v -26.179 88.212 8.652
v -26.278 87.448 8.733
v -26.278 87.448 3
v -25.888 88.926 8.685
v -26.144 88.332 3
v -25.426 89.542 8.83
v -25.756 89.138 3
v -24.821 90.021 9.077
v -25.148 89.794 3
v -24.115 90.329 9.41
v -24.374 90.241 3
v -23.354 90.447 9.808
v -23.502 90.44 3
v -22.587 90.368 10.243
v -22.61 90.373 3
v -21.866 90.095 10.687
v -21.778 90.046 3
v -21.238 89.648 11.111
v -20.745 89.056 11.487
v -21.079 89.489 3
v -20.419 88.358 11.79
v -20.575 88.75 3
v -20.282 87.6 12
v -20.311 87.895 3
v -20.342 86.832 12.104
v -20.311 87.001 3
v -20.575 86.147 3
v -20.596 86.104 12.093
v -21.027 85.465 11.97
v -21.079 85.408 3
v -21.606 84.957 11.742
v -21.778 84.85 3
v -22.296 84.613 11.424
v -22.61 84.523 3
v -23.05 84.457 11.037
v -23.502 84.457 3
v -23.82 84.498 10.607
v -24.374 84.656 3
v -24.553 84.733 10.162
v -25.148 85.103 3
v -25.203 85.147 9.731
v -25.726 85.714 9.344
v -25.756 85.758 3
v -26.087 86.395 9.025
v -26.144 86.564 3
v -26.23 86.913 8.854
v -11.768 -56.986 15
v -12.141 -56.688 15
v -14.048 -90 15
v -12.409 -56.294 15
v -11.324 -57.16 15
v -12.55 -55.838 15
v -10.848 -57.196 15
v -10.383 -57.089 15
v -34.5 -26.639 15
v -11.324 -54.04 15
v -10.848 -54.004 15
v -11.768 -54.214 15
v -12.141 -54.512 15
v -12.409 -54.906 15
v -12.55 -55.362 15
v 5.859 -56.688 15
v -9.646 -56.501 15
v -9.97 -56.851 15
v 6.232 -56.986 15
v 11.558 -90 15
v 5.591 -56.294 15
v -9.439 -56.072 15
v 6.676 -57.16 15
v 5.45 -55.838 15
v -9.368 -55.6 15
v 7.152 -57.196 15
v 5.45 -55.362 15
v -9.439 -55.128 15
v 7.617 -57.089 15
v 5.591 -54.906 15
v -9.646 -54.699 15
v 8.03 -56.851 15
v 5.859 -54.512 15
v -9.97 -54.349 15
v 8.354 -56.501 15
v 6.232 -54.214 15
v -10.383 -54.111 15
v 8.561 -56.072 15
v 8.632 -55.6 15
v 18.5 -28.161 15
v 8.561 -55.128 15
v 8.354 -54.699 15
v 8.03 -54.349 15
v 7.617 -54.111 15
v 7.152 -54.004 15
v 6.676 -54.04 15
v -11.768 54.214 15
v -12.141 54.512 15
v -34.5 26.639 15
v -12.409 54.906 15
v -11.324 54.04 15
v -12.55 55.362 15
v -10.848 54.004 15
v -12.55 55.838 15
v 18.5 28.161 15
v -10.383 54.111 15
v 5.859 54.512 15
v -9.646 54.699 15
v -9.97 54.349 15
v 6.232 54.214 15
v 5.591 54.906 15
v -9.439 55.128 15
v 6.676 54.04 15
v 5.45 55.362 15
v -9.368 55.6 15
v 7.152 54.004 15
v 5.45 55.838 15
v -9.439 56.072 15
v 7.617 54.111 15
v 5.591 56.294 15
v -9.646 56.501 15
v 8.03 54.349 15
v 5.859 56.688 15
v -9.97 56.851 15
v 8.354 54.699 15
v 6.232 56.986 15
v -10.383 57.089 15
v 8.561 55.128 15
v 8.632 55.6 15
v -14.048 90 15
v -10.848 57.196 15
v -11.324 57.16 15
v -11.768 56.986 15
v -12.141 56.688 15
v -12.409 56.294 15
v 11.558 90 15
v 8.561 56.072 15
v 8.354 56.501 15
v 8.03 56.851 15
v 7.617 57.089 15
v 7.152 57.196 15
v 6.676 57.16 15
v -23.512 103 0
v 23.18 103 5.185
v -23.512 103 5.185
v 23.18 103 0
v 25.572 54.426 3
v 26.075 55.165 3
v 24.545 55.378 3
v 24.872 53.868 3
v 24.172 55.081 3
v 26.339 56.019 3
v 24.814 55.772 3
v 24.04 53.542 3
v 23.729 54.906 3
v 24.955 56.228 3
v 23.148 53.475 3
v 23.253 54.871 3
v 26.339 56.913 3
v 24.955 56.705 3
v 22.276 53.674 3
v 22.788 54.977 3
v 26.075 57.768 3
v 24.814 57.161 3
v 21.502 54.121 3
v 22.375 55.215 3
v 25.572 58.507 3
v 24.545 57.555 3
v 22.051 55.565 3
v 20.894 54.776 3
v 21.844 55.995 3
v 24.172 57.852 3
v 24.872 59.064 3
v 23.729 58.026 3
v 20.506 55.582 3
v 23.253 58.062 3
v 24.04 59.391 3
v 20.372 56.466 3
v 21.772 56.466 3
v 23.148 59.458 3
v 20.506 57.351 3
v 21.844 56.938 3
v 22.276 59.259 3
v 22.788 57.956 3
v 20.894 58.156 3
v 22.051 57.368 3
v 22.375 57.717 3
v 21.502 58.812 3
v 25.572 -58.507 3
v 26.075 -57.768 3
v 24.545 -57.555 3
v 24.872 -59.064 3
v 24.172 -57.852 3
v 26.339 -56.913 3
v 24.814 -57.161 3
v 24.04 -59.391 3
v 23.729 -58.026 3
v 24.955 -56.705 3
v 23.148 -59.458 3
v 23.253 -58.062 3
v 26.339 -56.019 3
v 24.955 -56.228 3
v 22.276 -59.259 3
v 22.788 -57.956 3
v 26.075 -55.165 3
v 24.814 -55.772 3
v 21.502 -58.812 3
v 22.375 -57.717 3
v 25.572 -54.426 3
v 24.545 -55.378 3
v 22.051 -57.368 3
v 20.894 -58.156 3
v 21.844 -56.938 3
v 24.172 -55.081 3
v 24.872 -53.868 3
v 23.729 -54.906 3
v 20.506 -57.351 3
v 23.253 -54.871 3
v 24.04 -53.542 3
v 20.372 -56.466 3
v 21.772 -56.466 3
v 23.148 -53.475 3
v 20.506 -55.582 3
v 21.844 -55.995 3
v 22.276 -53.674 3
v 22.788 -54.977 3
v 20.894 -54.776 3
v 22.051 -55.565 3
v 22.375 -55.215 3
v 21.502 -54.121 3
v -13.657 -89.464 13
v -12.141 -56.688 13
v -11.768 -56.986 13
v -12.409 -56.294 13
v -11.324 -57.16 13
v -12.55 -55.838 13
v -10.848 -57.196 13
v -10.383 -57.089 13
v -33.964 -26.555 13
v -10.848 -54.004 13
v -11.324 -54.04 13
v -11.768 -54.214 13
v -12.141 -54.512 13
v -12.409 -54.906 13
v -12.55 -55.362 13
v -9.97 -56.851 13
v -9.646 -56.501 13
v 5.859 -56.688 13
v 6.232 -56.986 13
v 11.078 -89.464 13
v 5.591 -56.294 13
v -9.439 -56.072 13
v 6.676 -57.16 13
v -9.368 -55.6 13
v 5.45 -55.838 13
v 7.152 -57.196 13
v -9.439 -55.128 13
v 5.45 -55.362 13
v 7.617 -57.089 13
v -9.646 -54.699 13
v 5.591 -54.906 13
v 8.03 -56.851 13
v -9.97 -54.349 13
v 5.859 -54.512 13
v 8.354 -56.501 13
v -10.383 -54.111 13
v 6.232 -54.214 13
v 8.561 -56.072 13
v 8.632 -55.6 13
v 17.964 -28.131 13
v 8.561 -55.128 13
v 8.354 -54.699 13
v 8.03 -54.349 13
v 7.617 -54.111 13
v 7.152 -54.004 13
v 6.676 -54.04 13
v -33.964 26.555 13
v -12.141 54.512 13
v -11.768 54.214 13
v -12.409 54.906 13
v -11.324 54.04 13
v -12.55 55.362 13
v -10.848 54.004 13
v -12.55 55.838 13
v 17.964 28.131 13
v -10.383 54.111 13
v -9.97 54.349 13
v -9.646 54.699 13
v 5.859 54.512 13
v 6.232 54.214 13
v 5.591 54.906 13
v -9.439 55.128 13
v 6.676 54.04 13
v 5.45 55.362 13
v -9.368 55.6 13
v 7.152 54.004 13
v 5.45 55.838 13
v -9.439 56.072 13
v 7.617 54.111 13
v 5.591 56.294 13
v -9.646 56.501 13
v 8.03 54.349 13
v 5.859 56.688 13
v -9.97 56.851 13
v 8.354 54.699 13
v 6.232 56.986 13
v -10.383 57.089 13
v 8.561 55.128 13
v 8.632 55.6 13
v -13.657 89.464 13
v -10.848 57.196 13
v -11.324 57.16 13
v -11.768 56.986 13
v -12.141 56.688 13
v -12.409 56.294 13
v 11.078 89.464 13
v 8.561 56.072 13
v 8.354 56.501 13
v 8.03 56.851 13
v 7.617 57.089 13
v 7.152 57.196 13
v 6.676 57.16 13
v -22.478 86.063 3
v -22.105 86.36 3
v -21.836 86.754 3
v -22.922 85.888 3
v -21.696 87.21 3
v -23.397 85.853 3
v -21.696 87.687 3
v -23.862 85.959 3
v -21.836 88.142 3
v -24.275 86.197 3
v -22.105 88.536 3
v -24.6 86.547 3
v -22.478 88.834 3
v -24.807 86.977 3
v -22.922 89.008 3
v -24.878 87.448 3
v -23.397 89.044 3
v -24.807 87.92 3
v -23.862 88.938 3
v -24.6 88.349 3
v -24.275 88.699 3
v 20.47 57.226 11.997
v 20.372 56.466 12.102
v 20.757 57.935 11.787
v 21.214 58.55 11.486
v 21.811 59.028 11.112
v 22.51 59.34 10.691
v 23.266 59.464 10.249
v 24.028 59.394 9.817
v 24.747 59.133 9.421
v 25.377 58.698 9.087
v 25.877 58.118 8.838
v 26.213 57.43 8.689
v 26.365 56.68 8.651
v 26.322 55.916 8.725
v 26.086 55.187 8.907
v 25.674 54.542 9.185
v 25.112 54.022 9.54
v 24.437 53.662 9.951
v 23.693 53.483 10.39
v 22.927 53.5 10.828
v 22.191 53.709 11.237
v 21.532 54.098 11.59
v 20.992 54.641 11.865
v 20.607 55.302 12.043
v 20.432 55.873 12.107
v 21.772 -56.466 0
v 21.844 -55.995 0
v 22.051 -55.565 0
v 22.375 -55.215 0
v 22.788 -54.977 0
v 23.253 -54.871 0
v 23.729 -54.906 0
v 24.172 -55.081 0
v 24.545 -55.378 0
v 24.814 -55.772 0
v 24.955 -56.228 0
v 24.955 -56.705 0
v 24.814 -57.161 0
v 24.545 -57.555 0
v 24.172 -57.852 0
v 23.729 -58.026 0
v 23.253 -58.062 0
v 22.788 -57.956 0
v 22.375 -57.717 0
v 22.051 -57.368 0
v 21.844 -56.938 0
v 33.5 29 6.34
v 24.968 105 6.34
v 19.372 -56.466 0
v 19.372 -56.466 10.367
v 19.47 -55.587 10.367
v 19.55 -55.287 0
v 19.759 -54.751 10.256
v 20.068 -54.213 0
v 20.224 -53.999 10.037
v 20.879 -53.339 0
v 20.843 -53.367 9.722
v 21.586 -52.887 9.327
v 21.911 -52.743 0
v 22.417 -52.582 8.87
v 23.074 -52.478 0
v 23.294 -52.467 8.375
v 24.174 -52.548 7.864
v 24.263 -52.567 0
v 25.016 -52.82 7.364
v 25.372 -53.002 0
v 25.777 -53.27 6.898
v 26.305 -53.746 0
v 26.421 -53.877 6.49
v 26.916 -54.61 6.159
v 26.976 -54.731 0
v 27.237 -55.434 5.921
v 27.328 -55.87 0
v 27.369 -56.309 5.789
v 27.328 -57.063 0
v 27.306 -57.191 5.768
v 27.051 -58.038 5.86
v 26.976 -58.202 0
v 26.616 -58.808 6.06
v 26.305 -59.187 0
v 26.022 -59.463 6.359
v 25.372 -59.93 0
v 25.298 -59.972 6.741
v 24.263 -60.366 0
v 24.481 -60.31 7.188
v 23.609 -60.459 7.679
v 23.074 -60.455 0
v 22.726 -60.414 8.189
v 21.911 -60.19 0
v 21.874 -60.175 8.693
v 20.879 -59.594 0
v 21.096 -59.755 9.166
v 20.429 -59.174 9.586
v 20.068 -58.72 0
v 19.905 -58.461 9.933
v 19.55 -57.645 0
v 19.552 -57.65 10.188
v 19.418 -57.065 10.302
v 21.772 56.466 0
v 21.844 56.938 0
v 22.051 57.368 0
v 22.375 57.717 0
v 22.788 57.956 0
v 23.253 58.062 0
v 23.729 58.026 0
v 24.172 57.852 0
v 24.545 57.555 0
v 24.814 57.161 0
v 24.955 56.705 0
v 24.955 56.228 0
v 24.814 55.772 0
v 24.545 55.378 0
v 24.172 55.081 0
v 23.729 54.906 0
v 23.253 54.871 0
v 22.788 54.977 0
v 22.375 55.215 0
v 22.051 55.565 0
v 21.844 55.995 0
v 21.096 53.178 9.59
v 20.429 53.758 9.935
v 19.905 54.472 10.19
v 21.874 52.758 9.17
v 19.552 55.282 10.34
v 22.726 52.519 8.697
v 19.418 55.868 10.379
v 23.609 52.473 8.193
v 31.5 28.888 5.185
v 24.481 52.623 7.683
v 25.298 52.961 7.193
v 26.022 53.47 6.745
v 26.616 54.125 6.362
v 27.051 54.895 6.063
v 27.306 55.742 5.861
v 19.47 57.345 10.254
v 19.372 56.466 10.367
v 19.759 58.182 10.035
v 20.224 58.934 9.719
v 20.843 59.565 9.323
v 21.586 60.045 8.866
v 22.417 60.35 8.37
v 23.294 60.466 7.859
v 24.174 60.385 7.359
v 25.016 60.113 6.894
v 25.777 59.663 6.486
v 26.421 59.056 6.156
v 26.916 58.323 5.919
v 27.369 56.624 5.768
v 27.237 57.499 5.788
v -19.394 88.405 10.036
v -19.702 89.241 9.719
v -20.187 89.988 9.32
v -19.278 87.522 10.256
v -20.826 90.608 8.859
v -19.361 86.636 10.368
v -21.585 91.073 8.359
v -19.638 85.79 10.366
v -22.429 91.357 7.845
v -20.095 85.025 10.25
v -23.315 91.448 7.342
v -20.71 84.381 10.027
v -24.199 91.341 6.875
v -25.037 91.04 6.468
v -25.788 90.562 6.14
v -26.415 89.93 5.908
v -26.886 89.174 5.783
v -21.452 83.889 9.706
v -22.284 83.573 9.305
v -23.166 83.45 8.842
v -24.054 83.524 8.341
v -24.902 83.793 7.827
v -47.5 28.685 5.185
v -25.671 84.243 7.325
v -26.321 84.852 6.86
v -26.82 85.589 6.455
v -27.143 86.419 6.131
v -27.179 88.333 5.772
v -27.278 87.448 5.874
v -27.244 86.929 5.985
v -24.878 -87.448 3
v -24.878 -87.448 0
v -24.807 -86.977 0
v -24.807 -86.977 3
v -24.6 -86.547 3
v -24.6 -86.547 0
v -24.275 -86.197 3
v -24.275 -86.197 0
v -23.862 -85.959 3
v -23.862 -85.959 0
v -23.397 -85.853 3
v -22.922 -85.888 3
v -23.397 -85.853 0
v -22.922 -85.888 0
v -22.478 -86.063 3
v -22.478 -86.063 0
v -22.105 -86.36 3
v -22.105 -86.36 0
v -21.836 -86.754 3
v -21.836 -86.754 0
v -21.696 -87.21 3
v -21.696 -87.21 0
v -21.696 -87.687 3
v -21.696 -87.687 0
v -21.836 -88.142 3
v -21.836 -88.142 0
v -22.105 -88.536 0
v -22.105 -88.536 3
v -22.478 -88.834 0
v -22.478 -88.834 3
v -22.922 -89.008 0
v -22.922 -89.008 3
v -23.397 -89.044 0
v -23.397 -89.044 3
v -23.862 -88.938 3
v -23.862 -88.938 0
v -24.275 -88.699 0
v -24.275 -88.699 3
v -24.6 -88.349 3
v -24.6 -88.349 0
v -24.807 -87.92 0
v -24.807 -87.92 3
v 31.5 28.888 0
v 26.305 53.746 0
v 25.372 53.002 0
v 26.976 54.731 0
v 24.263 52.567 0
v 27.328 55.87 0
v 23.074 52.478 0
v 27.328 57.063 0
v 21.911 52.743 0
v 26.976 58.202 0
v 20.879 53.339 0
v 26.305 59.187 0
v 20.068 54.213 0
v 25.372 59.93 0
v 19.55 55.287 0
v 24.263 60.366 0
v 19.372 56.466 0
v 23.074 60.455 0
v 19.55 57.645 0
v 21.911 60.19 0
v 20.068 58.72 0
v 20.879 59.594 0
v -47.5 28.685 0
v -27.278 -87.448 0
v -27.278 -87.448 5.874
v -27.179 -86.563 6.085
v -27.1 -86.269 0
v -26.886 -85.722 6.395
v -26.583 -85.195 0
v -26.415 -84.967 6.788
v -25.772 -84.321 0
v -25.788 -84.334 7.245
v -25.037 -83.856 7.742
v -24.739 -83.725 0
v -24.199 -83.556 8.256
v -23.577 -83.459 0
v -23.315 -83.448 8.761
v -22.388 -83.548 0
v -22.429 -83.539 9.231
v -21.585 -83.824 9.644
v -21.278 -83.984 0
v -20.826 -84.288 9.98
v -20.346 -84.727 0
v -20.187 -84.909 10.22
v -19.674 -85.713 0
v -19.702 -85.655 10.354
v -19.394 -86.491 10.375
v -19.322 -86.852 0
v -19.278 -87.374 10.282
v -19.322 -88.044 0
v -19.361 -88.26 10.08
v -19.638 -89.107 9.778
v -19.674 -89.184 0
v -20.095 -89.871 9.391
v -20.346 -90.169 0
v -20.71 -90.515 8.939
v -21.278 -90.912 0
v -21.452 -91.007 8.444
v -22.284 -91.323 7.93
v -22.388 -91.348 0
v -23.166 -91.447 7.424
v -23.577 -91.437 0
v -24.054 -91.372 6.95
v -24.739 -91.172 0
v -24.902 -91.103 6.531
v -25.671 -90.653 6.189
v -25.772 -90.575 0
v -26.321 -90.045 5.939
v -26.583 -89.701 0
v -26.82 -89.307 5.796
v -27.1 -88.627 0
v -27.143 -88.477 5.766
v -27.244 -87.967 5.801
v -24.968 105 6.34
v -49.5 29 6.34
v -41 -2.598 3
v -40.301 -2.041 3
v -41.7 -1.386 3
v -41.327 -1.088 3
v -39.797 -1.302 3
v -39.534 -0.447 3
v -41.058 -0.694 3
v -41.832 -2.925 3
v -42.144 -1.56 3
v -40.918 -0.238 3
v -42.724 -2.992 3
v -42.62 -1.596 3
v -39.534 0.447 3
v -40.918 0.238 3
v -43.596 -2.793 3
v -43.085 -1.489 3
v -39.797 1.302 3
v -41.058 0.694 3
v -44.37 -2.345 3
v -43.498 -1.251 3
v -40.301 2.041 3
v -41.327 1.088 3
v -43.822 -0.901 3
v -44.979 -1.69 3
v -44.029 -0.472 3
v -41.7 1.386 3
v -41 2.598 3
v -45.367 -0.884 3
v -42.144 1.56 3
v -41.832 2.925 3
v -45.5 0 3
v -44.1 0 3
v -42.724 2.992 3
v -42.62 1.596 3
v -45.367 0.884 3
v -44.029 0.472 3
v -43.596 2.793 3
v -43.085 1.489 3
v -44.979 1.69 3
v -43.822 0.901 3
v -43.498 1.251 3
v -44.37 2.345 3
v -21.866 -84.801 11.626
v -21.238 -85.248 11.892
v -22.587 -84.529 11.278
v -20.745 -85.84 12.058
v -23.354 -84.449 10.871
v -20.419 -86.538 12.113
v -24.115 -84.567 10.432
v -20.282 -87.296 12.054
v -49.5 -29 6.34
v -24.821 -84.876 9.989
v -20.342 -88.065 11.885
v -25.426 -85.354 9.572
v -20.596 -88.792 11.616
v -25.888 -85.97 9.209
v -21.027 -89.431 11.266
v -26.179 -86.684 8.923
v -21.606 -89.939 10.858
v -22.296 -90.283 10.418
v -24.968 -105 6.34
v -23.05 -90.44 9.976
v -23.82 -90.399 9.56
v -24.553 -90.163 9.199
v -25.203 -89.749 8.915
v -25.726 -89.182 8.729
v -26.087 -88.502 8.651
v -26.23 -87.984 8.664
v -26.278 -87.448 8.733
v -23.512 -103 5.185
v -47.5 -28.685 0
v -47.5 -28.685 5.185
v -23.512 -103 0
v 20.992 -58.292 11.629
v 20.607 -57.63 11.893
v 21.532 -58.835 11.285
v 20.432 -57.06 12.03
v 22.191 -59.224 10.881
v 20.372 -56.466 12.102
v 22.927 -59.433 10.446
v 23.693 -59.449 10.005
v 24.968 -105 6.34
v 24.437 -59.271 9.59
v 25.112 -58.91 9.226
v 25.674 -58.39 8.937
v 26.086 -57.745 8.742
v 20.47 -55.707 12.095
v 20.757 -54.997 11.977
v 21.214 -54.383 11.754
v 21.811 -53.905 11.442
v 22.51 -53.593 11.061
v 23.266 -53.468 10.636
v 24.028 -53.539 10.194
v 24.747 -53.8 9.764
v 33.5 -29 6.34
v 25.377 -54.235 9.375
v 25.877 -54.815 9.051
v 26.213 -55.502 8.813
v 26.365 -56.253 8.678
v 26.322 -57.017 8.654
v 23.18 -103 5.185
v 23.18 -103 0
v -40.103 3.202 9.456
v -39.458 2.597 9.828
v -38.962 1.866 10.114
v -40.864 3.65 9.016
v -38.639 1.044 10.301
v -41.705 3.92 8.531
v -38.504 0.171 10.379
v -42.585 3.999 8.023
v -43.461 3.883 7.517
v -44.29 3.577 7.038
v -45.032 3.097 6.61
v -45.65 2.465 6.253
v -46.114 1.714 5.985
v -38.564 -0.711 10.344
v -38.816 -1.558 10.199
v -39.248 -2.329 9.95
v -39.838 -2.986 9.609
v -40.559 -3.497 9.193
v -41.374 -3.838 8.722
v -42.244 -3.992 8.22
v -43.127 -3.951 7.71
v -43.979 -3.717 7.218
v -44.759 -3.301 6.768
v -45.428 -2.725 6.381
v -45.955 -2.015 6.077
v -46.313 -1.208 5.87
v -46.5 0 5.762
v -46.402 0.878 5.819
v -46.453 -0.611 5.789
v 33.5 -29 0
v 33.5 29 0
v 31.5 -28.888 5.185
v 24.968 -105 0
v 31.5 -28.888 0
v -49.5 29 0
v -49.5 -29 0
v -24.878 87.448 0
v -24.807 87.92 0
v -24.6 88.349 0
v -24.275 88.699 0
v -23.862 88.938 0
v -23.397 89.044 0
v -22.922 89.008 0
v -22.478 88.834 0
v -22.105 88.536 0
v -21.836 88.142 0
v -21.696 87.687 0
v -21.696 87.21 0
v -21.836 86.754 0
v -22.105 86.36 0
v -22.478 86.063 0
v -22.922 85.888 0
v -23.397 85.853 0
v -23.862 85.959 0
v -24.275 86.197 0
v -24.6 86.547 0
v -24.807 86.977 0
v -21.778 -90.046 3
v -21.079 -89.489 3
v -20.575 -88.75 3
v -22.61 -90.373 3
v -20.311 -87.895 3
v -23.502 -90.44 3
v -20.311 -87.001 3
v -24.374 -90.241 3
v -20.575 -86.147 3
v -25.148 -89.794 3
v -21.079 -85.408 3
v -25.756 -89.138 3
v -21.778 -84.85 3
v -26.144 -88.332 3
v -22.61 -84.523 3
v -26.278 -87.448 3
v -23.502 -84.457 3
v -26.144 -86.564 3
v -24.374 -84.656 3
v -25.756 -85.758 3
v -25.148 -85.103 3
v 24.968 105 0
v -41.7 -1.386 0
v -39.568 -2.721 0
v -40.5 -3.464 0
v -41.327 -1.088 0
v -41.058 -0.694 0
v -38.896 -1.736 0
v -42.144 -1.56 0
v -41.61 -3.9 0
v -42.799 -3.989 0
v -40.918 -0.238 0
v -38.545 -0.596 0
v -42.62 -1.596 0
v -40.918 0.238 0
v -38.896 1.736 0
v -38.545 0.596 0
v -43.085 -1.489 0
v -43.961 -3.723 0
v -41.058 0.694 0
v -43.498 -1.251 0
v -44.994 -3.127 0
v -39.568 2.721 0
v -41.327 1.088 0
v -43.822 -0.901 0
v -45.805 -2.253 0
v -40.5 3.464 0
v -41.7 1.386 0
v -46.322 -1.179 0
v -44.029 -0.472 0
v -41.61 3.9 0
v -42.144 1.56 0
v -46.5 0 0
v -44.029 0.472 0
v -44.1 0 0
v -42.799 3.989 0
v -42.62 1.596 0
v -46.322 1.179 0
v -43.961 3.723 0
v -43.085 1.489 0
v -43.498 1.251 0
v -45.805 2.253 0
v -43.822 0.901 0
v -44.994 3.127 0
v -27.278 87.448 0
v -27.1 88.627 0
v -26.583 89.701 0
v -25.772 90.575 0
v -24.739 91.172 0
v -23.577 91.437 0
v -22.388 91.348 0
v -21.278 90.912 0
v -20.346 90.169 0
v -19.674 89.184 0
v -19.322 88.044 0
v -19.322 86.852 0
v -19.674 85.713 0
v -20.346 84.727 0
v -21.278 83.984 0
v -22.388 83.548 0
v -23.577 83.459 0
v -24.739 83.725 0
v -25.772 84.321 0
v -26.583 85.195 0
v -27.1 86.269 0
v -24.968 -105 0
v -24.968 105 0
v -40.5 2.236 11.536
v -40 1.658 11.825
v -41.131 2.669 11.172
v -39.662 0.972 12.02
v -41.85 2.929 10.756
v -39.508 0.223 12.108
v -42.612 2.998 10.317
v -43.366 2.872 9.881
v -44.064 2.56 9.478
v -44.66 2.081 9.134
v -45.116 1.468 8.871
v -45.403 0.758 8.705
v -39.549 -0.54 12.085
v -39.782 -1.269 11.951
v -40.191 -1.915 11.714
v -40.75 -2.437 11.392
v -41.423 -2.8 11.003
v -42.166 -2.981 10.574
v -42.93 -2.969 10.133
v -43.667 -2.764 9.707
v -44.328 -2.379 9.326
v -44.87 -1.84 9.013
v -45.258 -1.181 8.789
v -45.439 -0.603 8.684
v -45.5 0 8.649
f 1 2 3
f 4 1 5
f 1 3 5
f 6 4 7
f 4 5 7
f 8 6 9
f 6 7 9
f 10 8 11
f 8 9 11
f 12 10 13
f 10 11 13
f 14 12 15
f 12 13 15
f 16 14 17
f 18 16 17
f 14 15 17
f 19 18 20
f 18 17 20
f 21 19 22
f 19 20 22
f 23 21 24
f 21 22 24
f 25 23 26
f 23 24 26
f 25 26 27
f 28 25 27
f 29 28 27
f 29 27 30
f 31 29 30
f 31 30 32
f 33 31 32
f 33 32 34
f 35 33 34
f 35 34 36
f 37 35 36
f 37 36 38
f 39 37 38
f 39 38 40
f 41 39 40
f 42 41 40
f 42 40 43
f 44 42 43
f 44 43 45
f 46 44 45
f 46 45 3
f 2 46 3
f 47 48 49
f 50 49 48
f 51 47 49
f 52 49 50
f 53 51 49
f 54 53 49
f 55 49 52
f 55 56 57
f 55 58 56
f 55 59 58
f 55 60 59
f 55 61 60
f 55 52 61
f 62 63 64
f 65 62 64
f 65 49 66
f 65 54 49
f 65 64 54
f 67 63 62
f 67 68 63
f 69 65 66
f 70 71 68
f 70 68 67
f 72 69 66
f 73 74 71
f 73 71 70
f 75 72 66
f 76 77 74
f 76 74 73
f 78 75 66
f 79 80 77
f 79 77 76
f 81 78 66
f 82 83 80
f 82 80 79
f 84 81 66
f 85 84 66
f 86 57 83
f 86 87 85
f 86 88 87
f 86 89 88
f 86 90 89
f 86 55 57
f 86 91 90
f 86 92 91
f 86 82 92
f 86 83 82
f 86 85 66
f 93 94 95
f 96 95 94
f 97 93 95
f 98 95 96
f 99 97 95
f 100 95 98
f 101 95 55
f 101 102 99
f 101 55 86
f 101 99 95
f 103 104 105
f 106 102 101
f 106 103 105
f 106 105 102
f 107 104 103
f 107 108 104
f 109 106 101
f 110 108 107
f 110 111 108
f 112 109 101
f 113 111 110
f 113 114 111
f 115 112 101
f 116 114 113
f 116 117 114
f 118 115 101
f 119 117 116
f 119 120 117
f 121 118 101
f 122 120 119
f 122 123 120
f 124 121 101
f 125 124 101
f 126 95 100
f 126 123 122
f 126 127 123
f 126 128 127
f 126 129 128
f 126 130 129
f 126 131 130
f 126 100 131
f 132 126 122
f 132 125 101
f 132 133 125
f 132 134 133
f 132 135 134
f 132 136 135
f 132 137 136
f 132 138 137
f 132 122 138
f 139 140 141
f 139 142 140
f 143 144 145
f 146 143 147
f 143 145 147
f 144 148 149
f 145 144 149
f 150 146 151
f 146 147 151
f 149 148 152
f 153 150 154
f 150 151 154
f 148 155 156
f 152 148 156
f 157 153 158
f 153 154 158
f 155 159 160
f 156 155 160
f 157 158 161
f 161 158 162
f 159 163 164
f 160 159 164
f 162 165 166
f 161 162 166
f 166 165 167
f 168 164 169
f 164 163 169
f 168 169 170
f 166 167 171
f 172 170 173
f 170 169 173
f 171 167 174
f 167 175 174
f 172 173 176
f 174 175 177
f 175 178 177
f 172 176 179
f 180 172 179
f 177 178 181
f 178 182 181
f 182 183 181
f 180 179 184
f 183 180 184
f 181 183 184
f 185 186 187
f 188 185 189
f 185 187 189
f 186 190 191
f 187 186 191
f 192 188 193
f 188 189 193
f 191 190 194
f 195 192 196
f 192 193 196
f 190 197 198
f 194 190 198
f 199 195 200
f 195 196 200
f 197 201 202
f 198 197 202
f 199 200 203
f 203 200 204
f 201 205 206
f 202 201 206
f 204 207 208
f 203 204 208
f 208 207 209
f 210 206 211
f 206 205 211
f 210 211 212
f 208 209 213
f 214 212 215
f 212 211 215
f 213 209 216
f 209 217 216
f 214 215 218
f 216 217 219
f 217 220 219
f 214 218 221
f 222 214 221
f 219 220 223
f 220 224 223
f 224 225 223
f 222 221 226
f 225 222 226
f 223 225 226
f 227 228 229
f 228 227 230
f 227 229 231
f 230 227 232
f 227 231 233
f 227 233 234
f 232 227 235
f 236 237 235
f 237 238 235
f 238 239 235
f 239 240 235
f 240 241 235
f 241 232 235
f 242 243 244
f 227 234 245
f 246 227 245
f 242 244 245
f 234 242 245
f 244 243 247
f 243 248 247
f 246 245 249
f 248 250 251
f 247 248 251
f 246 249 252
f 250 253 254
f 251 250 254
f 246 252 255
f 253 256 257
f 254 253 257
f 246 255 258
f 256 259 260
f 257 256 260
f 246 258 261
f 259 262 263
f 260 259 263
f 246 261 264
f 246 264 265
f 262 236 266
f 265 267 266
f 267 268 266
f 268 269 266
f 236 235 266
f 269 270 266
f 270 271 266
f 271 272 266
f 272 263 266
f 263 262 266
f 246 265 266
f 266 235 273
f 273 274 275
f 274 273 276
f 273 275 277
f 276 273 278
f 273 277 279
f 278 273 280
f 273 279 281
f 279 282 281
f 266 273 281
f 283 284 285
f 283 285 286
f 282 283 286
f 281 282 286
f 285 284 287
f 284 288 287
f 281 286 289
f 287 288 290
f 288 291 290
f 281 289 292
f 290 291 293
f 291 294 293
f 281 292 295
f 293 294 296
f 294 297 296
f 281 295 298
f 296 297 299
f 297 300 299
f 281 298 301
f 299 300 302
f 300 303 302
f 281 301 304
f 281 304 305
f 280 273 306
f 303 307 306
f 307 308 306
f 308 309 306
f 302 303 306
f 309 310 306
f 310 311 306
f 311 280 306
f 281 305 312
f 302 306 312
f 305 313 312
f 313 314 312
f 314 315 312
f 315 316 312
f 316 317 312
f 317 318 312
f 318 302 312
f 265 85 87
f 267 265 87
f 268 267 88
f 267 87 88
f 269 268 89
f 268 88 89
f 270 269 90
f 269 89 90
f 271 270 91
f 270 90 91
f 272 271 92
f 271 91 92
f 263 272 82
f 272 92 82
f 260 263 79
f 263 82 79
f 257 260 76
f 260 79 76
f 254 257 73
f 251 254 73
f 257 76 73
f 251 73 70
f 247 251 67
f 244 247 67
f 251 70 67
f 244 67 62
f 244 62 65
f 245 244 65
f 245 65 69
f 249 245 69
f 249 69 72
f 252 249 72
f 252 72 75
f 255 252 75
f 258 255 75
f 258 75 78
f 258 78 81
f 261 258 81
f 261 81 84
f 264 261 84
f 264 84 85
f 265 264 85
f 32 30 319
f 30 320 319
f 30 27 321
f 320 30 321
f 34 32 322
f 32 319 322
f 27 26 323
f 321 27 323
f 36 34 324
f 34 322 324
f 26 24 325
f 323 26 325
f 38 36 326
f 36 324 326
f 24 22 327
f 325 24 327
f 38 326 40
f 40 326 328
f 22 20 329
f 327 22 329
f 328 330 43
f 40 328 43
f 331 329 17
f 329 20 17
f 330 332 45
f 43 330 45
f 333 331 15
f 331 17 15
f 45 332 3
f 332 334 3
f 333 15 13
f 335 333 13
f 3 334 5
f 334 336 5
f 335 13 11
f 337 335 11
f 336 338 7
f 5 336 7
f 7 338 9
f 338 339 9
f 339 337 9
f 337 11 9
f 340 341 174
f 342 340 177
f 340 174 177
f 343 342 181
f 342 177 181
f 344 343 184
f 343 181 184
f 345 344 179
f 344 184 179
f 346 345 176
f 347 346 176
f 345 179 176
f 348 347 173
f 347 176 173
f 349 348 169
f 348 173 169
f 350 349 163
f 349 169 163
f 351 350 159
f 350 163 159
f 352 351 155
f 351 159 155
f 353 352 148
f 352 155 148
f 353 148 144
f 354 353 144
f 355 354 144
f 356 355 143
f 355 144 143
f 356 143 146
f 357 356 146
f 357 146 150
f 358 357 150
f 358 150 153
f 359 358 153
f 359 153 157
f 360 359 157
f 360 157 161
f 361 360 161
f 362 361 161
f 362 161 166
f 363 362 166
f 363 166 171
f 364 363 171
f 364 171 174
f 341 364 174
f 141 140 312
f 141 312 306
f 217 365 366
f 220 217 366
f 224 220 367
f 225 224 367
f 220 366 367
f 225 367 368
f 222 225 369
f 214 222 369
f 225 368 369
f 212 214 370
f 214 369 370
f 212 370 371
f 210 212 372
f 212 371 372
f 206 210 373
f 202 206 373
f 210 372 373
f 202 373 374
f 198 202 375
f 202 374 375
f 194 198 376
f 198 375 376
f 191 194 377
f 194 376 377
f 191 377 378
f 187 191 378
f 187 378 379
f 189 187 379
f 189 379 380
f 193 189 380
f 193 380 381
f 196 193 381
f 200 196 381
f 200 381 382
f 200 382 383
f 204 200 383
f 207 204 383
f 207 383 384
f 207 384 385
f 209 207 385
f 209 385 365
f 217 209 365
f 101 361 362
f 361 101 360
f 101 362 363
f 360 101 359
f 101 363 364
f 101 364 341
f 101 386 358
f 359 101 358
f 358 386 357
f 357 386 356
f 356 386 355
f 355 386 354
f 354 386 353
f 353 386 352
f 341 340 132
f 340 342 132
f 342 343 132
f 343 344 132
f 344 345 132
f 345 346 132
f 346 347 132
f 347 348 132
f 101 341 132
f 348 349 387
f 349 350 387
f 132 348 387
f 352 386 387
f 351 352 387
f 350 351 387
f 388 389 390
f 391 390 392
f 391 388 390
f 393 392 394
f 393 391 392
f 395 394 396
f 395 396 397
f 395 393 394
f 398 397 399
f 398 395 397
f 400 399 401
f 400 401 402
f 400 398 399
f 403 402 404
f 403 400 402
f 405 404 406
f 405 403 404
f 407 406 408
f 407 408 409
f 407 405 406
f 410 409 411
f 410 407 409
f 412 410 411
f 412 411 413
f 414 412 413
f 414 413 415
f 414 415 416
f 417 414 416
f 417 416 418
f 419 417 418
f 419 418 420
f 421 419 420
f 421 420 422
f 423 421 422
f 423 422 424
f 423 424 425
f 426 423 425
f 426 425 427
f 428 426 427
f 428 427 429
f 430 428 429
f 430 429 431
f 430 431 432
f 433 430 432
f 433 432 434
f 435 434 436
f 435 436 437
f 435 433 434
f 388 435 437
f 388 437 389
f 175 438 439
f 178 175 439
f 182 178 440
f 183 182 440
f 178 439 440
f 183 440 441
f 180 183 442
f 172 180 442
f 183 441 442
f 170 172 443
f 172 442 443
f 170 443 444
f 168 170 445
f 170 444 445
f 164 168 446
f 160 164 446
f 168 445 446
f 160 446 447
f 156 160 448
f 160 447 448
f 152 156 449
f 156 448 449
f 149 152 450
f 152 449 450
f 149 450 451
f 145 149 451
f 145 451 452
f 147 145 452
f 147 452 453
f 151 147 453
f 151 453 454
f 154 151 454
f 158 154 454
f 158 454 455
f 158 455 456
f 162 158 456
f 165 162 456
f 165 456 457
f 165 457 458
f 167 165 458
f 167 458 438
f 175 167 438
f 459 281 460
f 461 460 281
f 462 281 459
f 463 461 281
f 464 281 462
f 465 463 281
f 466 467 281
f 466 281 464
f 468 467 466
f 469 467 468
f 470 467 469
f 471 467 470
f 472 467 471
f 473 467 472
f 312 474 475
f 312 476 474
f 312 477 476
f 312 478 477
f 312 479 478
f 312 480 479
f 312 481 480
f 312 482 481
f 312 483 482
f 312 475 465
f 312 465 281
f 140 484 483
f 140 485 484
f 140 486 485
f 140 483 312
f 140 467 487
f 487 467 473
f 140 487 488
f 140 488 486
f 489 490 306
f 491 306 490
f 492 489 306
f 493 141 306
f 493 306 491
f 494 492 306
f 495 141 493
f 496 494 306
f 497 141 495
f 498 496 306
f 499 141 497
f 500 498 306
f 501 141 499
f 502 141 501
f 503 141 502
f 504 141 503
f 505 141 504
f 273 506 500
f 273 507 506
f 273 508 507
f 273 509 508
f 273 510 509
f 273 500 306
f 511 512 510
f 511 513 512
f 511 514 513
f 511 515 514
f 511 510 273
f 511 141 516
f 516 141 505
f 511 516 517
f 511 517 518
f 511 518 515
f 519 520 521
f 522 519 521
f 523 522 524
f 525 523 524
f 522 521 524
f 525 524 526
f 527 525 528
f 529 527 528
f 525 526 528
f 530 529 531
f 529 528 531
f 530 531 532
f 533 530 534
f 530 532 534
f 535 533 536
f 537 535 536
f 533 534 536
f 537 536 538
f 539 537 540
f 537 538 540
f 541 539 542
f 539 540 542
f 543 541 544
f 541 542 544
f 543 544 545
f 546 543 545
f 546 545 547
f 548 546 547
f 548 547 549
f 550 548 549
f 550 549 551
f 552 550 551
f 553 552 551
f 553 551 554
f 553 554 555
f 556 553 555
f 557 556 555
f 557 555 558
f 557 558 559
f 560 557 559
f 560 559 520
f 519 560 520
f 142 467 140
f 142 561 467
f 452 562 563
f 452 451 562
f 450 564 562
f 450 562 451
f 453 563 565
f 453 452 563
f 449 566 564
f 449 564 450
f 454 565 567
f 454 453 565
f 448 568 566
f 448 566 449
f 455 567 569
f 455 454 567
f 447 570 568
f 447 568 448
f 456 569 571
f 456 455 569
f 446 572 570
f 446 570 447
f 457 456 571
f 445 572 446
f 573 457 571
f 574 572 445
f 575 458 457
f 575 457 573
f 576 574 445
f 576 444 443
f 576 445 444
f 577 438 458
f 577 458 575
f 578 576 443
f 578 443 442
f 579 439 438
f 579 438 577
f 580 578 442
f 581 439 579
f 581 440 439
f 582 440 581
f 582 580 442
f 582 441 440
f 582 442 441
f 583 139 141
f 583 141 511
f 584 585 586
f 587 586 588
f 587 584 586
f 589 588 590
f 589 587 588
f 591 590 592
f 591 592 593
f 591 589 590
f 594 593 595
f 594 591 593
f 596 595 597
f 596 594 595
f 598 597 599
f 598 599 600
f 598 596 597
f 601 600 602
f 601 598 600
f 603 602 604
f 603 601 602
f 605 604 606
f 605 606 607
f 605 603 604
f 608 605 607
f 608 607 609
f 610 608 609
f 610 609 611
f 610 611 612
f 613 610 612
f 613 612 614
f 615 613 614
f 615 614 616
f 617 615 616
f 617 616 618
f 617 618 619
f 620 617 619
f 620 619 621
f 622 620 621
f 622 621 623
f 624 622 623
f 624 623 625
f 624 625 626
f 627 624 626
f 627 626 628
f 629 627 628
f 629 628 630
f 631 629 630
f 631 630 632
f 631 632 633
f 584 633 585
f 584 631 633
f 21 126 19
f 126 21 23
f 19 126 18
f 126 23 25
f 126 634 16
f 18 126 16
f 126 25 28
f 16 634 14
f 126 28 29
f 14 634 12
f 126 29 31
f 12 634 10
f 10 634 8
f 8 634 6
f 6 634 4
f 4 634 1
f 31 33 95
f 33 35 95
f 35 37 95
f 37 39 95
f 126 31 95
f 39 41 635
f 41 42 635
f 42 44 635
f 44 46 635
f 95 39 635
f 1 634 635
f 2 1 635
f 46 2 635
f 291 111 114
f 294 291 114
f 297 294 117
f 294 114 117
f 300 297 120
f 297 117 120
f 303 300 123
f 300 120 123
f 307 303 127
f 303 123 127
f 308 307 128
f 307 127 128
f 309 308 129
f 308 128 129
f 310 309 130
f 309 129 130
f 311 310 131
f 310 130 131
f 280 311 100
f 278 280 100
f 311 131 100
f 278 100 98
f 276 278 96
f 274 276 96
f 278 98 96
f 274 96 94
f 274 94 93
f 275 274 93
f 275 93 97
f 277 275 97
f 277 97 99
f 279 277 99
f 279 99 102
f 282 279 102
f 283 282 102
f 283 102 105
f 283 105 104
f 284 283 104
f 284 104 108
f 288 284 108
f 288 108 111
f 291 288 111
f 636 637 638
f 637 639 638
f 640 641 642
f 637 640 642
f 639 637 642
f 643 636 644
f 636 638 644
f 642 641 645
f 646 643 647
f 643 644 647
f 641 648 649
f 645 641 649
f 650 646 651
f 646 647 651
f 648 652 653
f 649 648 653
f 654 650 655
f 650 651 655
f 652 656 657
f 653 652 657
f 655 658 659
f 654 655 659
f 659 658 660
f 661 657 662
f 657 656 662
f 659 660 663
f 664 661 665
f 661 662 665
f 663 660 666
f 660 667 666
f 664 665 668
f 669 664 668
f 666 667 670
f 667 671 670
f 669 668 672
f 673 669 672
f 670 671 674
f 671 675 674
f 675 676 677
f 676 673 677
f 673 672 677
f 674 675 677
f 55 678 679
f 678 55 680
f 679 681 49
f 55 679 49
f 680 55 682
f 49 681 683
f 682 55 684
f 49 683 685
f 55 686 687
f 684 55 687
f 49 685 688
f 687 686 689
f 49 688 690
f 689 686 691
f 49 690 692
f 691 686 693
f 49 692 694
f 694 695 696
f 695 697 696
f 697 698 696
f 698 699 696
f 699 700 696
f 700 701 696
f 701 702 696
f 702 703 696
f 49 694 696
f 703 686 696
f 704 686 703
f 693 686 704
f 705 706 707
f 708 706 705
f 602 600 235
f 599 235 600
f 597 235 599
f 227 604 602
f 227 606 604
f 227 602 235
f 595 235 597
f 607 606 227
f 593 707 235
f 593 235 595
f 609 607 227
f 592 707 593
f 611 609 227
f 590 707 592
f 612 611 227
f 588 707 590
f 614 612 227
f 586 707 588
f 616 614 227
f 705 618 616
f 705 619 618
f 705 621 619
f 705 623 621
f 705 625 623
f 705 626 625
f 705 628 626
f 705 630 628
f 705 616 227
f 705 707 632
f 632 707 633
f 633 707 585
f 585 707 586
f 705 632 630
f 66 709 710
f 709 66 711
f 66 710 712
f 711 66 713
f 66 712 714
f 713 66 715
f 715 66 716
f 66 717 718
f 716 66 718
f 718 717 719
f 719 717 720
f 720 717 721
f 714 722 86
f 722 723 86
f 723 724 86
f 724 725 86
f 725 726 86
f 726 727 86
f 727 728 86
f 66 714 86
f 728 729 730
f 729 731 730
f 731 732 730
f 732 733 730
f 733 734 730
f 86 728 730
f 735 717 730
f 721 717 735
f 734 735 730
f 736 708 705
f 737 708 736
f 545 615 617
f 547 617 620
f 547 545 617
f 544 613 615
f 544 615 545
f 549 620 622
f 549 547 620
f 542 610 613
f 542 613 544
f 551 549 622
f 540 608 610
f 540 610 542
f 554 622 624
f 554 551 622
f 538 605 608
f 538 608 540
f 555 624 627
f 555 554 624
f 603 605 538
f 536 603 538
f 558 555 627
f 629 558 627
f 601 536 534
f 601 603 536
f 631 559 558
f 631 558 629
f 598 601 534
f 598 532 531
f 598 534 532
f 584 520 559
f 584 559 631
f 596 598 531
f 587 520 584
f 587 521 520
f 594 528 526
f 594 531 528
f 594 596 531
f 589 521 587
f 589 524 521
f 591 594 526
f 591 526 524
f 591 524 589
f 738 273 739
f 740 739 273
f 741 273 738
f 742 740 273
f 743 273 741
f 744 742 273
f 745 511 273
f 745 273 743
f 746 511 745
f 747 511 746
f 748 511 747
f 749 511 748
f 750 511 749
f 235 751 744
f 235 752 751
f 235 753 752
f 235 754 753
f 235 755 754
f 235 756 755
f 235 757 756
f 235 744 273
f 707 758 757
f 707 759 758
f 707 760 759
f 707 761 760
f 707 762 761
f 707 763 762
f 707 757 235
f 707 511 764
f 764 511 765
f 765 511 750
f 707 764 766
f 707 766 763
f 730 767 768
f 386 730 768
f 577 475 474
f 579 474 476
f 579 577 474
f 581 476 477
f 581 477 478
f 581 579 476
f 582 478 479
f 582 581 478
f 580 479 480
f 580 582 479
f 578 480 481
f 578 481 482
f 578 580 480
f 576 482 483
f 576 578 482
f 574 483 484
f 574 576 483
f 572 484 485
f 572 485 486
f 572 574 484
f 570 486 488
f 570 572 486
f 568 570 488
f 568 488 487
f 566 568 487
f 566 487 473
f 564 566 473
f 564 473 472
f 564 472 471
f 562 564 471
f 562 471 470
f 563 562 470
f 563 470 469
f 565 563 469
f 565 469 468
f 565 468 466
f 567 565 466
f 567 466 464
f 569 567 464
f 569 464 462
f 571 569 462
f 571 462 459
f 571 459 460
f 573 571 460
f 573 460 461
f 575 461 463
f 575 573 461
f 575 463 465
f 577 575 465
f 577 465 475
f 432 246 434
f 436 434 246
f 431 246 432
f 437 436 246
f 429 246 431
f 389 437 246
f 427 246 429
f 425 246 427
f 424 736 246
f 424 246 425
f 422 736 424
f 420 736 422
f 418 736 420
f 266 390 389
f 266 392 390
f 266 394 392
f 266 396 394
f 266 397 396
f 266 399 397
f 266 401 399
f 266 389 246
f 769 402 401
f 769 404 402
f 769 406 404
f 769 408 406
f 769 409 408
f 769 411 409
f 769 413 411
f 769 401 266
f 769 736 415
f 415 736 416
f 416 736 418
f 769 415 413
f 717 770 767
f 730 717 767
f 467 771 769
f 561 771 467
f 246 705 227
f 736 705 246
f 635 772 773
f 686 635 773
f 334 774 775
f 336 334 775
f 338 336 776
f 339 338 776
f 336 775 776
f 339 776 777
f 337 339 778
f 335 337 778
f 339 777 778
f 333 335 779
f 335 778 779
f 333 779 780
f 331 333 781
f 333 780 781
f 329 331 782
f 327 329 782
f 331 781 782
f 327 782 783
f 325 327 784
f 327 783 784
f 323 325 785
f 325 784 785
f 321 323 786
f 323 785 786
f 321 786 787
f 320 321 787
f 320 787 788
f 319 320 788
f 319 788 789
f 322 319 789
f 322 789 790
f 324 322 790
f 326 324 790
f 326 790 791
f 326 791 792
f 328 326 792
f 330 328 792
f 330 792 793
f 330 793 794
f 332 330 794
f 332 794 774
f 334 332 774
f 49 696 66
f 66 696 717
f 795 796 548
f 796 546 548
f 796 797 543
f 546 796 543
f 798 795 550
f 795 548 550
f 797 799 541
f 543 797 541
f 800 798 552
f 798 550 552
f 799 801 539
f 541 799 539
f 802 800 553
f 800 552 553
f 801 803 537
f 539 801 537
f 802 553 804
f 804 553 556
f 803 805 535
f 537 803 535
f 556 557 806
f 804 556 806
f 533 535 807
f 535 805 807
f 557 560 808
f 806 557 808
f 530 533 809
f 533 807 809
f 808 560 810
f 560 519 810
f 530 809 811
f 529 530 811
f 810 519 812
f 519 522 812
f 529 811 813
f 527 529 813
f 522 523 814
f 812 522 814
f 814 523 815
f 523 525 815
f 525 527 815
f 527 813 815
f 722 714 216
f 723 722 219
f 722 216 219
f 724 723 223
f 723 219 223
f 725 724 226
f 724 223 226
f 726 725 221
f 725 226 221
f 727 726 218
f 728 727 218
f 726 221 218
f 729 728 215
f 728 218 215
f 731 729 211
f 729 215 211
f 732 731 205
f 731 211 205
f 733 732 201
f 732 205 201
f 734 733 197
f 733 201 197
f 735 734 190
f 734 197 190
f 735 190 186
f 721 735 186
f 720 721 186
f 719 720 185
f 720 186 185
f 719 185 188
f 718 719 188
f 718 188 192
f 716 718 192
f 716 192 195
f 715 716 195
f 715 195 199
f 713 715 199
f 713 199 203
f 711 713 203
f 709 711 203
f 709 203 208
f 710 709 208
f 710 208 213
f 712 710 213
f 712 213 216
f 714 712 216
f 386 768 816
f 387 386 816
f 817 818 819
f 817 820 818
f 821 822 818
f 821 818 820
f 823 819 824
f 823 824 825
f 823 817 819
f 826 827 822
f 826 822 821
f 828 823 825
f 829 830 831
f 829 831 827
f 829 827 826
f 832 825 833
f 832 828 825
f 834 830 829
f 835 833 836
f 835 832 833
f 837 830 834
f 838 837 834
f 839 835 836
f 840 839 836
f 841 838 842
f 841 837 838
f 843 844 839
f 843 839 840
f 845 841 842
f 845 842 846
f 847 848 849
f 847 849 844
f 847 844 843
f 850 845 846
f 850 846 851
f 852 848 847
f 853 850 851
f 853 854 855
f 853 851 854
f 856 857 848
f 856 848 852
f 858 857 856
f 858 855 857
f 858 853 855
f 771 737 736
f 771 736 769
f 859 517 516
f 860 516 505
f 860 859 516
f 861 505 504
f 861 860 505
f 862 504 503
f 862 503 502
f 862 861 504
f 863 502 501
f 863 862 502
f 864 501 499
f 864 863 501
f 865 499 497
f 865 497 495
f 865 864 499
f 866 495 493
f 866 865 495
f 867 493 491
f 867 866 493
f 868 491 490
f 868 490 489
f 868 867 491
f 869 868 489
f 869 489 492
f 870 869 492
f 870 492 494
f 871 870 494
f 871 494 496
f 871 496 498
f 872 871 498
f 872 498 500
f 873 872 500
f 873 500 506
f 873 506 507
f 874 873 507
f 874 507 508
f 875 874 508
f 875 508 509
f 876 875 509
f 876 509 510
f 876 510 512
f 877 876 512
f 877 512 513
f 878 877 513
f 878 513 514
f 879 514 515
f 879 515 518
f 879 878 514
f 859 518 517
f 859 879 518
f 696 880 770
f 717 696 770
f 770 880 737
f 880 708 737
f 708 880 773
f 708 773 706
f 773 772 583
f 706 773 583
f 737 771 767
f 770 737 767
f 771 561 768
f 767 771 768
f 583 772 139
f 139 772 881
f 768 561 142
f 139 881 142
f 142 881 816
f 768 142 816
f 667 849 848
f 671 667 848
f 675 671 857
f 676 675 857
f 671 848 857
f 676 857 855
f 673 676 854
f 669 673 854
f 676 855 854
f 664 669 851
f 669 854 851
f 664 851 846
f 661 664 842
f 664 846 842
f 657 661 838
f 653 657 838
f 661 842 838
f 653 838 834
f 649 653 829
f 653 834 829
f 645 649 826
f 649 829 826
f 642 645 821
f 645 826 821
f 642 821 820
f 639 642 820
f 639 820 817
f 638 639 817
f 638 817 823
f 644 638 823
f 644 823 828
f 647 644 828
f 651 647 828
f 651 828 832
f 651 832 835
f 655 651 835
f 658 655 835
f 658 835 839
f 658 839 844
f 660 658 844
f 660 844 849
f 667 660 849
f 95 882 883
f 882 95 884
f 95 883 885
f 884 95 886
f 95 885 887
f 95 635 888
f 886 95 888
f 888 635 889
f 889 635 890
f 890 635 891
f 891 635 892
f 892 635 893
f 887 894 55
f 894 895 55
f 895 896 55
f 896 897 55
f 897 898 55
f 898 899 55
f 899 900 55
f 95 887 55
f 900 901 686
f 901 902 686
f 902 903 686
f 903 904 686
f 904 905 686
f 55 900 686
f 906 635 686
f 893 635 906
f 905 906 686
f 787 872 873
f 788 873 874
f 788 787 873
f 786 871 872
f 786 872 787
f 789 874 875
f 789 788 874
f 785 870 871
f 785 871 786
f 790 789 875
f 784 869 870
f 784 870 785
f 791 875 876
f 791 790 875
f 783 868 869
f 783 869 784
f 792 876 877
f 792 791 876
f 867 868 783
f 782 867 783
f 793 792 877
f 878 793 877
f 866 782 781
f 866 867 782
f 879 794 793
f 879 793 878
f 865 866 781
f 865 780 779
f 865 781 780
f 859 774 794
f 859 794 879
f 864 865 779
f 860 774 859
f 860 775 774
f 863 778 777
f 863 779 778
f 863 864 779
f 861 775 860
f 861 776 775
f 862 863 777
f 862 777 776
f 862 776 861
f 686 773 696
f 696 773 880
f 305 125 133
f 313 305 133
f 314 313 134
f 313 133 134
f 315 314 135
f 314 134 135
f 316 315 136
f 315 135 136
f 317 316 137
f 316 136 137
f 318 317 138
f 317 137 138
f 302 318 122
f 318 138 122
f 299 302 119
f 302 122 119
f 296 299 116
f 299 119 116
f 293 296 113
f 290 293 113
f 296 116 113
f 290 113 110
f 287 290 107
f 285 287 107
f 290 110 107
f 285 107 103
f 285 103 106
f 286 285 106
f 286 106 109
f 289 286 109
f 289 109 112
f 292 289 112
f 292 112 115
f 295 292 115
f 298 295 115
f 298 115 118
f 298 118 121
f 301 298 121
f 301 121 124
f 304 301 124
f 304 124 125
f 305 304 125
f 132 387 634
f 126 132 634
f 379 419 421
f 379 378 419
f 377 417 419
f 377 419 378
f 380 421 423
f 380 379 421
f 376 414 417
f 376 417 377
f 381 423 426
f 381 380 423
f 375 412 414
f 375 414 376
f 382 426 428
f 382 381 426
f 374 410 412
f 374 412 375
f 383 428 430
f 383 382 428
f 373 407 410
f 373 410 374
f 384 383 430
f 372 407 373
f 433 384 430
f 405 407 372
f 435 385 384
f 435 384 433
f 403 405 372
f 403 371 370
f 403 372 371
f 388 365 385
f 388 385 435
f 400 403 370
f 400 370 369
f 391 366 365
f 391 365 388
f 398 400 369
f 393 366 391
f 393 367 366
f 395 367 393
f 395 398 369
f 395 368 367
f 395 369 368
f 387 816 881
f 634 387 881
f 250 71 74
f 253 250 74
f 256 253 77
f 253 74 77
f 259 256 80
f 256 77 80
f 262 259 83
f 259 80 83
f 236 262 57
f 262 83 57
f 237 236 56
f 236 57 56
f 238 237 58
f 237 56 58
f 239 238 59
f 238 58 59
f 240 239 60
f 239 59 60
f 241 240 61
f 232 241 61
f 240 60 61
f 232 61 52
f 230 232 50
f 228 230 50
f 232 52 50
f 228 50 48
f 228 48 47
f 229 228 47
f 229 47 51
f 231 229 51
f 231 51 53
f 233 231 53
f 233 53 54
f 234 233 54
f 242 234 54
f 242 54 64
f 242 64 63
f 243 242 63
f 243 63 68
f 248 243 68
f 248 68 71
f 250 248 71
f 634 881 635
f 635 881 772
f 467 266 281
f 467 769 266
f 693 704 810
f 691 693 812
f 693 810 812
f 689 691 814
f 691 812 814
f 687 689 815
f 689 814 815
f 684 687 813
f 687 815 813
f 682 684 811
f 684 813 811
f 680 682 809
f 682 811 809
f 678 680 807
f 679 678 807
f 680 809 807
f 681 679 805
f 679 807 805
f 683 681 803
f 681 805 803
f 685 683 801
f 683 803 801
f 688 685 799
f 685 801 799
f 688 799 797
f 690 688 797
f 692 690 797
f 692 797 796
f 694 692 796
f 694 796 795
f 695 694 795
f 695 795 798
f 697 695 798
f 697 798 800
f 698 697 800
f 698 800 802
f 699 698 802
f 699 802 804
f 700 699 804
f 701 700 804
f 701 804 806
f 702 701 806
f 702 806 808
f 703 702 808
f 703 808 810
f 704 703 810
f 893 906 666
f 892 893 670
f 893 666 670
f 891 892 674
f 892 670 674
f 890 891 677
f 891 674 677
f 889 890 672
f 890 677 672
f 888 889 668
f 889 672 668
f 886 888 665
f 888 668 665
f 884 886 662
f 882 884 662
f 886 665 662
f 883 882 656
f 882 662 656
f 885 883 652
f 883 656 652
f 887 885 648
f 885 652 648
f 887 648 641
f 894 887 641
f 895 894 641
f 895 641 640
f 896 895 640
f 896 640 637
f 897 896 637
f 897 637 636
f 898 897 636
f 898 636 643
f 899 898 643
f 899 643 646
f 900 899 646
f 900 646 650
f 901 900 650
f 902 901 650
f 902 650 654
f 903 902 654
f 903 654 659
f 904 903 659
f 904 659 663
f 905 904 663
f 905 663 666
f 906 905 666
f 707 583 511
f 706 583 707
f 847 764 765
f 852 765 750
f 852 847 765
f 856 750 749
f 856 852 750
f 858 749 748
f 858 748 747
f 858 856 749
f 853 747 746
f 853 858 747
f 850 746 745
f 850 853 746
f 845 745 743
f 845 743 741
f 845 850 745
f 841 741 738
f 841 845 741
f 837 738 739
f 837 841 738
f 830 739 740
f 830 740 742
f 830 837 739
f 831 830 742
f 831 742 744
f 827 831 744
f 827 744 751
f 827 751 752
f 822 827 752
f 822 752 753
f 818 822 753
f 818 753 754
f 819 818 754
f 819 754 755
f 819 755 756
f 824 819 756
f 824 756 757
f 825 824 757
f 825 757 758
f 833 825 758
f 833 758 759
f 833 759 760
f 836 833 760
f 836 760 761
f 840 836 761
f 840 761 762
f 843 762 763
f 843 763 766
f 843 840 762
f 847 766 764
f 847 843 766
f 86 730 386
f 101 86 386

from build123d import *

# Parameters (mm, degrees)
EXTRUDE1_DEPTH     = 15
CHAMFER1_SIZE      = 15
CHAMFER1_SIZE2     = 8.660254038
SHELL1_T           = -2
EXTRUDE2_REACH     = 119.048
SKETCH2_R          = 4
SKETCH2_R_2        = 1.6
SKETCH3_R          = 3
CUT_EXTRUDE1_DEPTH = 15
SKETCH5_R          = 1.6
CUT_EXTRUDE2_DEPTH = 20


with BuildPart() as part:
    # Sketch1 → Extrude1 (new body)
    with BuildSketch(Plane.XY):
        Polygon((-24.967783135, 105), (-49.5, 29), (-49.5, -29), (-24.967783135, -105), (24.967783135, -105), (33.5, -29), (33.5, 29), (24.967783135, 105), align=None)
    extrude(amount=EXTRUDE1_DEPTH)

    # Chamfer1
    chamfer1_edges = [part.edges().sort_by_distance(p)[0] for p in [
        (-49.5, 0, 15),
        (-37.233891568, -67, 15),
        (0, -105, 15),
        (29.233891568, -67, 15),
        (33.5, 0, 15),
        (29.233891568, 67, 15),
        (0, 105, 15),
        (-37.233891568, 67, 15),
    ]]
    chamfer1_side = [part.faces().sort_by_distance(p)[0] for p in [
        (-5.515477183, 0, 15),
    ]]
    chamfer(chamfer1_edges, length=CHAMFER1_SIZE, length2=CHAMFER1_SIZE2, reference=chamfer1_side[0])

    # Shell1
    shell1_openings = [part.faces().sort_by_distance(p)[0] for p in [
        (-5.515477183, 0, 0),
    ]]
    offset(amount=SHELL1_T, openings=shell1_openings, kind=Kind.INTERSECTION)

    # Sketch2 → Extrude2 (add, up to next)
    with BuildSketch(Plane(origin=(0, 0, 0), x_dir=(-1, 0, 0), z_dir=(0, 0, -1)), mode=Mode.PRIVATE) as extrude2_sk1:
        with Locations((23.2777341, 87.448162672)):
            Circle(SKETCH2_R)
        with Locations((23.2777341, 87.448162672)):
            Circle(SKETCH2_R_2, mode=Mode.SUBTRACT)
    extrude2_tool1 = extrude(extrude2_sk1.sketch, amount=-EXTRUDE2_REACH, mode=Mode.PRIVATE) - part.part
    # Sketch2 → Extrude2 (add, up to next)
    with BuildSketch(Plane(origin=(0, 0, 0), x_dir=(-1, 0, 0), z_dir=(0, 0, -1)), mode=Mode.PRIVATE) as extrude2_sk2:
        with Locations((-23.372488986, 56.466339116)):
            Circle(SKETCH2_R)
        with Locations((-23.372488986, 56.466339116)):
            Circle(SKETCH2_R_2, mode=Mode.SUBTRACT)
    extrude2_tool2 = extrude(extrude2_sk2.sketch, amount=-EXTRUDE2_REACH, mode=Mode.PRIVATE) - part.part
    # Sketch2 → Extrude2 (add, up to next)
    with BuildSketch(Plane(origin=(0, 0, 0), x_dir=(-1, 0, 0), z_dir=(0, 0, -1)), mode=Mode.PRIVATE) as extrude2_sk3:
        with Locations((42.5, 0)):
            Circle(SKETCH2_R)
        with Locations((42.5, 0)):
            Circle(SKETCH2_R_2, mode=Mode.SUBTRACT)
    extrude2_tool3 = extrude(extrude2_sk3.sketch, amount=-EXTRUDE2_REACH, mode=Mode.PRIVATE) - part.part
    # Sketch2 → Extrude2 (add, up to next)
    with BuildSketch(Plane(origin=(0, 0, 0), x_dir=(-1, 0, 0), z_dir=(0, 0, -1)), mode=Mode.PRIVATE) as extrude2_sk4:
        with Locations((-23.372488986, -56.466339116)):
            Circle(SKETCH2_R)
        with Locations((-23.372488986, -56.466339116)):
            Circle(SKETCH2_R_2, mode=Mode.SUBTRACT)
    extrude2_tool4 = extrude(extrude2_sk4.sketch, amount=-EXTRUDE2_REACH, mode=Mode.PRIVATE) - part.part
    # Sketch2 → Extrude2 (add, up to next)
    with BuildSketch(Plane(origin=(0, 0, 0), x_dir=(-1, 0, 0), z_dir=(0, 0, -1)), mode=Mode.PRIVATE) as extrude2_sk5:
        with Locations((23.2777341, -87.448162672)):
            Circle(SKETCH2_R)
        with Locations((23.2777341, -87.448162672)):
            Circle(SKETCH2_R_2, mode=Mode.SUBTRACT)
    extrude2_tool5 = extrude(extrude2_sk5.sketch, amount=-EXTRUDE2_REACH, mode=Mode.PRIVATE) - part.part
    add(extrude2_tool1.solids().sort_by_distance((-19.390871, 87.448163, 0))[0])
    add(extrude2_tool2.solids().sort_by_distance((27.259352, 56.466339, 0))[0])
    add(extrude2_tool3.solids().sort_by_distance((-38.613137, 0, 0))[0])
    add(extrude2_tool4.solids().sort_by_distance((27.259352, -56.466339, 0))[0])
    add(extrude2_tool5.solids().sort_by_distance((-19.390871, -87.448163, 0))[0])

    # Sketch3 → Cut-Extrude1 (cut)
    with BuildSketch(Plane(origin=(0, 0, 3), x_dir=(-1, 0, 0), z_dir=(0, 0, -1))):
        with Locations((23.2777341, 87.448162672)):
            Circle(SKETCH3_R)
        with Locations((-23.372488986, 56.466339116)):
            Circle(SKETCH3_R)
        with Locations((-23.372488986, -56.466339116)):
            Circle(SKETCH3_R)
        with Locations((23.2777341, -87.448162672)):
            Circle(SKETCH3_R)
        with Locations((42.5, 0)):
            Circle(SKETCH3_R)
    extrude(amount=-CUT_EXTRUDE1_DEPTH, mode=Mode.SUBTRACT)

    # Sketch5 → Cut-Extrude2 (cut)
    with BuildSketch(Plane.XY.offset(19)):
        with Locations((-10.967783135, 55.6)):
            Circle(SKETCH5_R)
        with Locations((7.032216865, 55.6)):
            Circle(SKETCH5_R)
        with Locations((7.032216865, -55.6)):
            Circle(SKETCH5_R)
        with Locations((-10.967783135, -55.6)):
            Circle(SKETCH5_R)
    extrude(amount=-CUT_EXTRUDE2_DEPTH, mode=Mode.SUBTRACT)


solid = part.part
